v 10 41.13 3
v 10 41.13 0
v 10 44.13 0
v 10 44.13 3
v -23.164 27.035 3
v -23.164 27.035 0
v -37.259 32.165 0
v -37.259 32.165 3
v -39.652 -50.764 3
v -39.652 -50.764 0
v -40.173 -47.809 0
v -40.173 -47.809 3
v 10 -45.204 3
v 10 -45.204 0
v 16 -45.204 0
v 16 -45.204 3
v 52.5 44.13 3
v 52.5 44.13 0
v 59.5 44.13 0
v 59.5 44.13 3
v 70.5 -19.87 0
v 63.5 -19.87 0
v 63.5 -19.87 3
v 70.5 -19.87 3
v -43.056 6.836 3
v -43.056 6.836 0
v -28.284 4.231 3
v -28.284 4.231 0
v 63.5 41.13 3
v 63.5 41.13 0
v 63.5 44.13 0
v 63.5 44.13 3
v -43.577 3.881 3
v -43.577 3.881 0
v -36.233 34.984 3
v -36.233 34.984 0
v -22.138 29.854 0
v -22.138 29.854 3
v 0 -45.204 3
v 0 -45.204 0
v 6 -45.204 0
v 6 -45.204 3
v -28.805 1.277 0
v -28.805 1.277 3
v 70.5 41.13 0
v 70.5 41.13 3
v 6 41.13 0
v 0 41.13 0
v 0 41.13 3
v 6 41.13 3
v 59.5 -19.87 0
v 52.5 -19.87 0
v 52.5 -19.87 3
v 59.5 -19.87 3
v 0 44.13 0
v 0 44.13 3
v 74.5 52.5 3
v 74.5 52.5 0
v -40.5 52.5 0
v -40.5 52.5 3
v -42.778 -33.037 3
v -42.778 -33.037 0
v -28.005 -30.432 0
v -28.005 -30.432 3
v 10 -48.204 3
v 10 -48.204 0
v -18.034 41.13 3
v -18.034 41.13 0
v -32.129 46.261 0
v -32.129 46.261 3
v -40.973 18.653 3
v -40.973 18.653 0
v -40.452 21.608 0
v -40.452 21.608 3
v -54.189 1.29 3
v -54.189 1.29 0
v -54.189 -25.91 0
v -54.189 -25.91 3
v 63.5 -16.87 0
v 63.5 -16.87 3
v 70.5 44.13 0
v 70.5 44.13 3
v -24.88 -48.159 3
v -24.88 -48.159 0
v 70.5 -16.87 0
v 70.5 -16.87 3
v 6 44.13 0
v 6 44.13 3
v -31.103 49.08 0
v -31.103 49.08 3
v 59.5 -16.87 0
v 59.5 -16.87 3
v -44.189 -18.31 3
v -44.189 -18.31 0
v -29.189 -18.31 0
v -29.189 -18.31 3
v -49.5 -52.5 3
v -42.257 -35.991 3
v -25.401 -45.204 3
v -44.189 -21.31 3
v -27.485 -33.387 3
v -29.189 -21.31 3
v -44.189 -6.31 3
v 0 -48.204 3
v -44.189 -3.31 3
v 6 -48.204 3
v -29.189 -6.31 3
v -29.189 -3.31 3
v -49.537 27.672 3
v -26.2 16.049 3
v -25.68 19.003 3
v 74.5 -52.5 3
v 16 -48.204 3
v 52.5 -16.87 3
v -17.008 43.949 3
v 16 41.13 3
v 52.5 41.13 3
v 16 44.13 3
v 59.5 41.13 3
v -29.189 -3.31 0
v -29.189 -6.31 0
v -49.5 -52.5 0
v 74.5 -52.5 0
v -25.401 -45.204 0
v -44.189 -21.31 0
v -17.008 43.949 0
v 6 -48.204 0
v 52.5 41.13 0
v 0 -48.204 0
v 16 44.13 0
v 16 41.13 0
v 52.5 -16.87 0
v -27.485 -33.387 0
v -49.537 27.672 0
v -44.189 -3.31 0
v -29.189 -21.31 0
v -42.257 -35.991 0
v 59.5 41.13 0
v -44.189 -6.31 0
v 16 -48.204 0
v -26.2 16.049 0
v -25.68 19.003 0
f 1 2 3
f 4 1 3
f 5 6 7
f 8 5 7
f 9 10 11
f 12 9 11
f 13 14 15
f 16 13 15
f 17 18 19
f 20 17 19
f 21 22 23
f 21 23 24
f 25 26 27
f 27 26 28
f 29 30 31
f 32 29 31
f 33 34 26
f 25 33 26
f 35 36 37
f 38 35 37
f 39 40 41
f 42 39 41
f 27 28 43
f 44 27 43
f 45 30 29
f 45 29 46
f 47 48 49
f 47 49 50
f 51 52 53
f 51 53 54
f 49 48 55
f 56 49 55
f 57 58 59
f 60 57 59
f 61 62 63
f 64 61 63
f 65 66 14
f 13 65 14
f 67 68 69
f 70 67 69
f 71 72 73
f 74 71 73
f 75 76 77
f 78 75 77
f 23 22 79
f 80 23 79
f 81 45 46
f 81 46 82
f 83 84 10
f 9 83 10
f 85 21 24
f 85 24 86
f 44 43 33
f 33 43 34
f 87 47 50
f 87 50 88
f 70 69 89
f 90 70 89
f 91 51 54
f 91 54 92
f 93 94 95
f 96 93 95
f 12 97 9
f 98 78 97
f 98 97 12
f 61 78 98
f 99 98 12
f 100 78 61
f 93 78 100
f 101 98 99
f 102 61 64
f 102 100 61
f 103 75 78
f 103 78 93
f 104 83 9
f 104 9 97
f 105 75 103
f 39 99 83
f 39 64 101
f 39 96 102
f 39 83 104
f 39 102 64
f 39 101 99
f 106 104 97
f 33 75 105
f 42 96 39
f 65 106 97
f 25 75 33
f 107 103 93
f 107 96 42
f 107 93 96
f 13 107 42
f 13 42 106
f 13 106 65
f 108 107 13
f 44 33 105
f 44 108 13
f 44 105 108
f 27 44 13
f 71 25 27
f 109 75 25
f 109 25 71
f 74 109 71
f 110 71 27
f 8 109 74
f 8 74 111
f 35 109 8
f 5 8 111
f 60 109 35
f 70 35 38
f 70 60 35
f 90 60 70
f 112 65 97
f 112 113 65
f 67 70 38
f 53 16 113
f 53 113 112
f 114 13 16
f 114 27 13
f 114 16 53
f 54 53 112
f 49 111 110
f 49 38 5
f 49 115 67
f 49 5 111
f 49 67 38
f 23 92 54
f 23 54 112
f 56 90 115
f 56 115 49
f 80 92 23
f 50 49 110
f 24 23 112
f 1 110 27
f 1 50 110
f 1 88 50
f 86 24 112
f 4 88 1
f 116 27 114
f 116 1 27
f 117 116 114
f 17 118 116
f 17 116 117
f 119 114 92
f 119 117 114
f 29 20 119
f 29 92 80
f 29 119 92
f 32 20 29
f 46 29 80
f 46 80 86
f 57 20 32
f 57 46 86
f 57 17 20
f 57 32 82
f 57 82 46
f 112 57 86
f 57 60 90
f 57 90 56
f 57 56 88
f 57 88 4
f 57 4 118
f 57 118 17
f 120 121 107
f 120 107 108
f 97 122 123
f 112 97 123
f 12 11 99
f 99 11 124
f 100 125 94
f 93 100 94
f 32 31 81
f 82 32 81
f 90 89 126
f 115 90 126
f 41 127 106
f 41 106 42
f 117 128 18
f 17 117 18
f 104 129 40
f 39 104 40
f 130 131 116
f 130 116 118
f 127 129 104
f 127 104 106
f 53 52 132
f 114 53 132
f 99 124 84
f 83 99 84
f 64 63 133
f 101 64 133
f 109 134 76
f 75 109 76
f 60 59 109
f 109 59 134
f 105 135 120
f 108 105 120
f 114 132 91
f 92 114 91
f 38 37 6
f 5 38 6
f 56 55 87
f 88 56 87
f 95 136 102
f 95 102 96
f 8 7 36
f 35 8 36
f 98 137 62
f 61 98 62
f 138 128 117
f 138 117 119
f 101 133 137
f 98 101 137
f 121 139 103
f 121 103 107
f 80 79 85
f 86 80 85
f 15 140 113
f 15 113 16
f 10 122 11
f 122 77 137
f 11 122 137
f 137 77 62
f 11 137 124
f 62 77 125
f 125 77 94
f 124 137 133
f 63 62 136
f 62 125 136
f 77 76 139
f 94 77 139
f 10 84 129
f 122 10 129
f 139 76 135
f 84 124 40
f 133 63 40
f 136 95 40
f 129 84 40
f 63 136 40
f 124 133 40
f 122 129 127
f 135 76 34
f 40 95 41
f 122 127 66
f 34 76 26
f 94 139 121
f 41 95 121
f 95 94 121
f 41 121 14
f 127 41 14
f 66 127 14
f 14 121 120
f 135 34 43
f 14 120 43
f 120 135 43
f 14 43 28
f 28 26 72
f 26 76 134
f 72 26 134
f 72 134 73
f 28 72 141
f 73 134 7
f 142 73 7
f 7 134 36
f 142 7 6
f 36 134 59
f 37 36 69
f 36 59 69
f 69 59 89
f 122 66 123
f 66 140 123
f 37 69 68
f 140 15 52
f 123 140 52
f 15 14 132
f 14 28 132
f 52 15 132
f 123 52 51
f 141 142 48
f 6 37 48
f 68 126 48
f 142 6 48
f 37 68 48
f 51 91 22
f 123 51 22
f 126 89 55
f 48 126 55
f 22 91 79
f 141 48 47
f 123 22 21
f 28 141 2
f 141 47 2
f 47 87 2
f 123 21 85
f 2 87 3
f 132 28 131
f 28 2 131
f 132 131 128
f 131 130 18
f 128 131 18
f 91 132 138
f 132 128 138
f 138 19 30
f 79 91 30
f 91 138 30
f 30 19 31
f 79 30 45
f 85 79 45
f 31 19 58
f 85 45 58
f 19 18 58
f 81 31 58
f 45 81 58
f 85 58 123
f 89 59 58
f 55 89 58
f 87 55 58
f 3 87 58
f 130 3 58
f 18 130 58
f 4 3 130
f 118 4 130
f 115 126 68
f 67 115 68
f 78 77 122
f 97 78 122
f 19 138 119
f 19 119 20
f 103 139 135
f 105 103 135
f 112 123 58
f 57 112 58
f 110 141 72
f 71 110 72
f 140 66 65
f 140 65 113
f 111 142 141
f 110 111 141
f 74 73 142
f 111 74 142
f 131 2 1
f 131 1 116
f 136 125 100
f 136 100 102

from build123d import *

# Parameters (mm, degrees)
F0_W     = 6
F0_H     = 3
F0_W_2   = 15
F0_W_3   = 7
F1_DEPTH = 3


with BuildPart() as f1:
    # F0 (on Top) → F1 (new body)
    with BuildSketch(Plane.XY):
        Polygon((-49.5, -52.5), (49.5, -52.5), (74.5, -52.5), (74.5, 52.5), (49.5, 52.5), (-40.5, 52.5), (-49.536567, 27.672236), (-54.188501, 1.289809), (-54.188501, -25.910191), align=None)
        Polygon((-40.172867, -47.809095), (-25.400751, -45.204372), (-24.879806, -48.158796), (-39.651922, -50.763518), align=None, mode=Mode.SUBTRACT)
        Polygon((-27.484529, -33.386679), (-42.256645, -35.991402), (-42.77759, -33.036979), (-28.005473, -30.432256), align=None, mode=Mode.SUBTRACT)
        with Locations((3, -46.704372)):
            Rectangle(F0_W, F0_H, mode=Mode.SUBTRACT)
        with Locations((-36.688501, -19.810191)):
            Rectangle(F0_W_2, F0_H, mode=Mode.SUBTRACT)
        with Locations((-36.688501, -4.810191)):
            Rectangle(F0_W_2, F0_H, mode=Mode.SUBTRACT)
        with Locations((13, -46.704372)):
            Rectangle(F0_W, F0_H, mode=Mode.SUBTRACT)
        with Locations((56, -18.369581)):
            Rectangle(F0_W_3, F0_H, mode=Mode.SUBTRACT)
        with Locations((67, -18.369581)):
            Rectangle(F0_W_3, F0_H, mode=Mode.SUBTRACT)
        Polygon((-43.056346, 6.835694), (-28.284229, 4.230971), (-28.805174, 1.276548), (-43.57729, 3.881271), align=None, mode=Mode.SUBTRACT)
        Polygon((-40.972567, 18.653387), (-40.451623, 21.60781), (-25.679507, 19.003088), (-26.200451, 16.048665), align=None, mode=Mode.SUBTRACT)
        Polygon((-22.137987, 29.854107), (-23.164047, 27.035029), (-37.259436, 32.165331), (-36.233376, 34.984409), align=None, mode=Mode.SUBTRACT)
        Polygon((-18.033745, 41.130419), (-32.129134, 46.260721), (-31.103074, 49.079799), (-17.007684, 43.949496), align=None, mode=Mode.SUBTRACT)
        with Locations((3, 42.630419)):
            Rectangle(F0_W, F0_H, mode=Mode.SUBTRACT)
        with Locations((13, 42.630419)):
            Rectangle(F0_W, F0_H, mode=Mode.SUBTRACT)
        with Locations((56, 42.630419)):
            Rectangle(F0_W_3, F0_H, mode=Mode.SUBTRACT)
        with Locations((67, 42.630419)):
            Rectangle(F0_W_3, F0_H, mode=Mode.SUBTRACT)
    extrude(amount=F1_DEPTH)


solid = f1.part
